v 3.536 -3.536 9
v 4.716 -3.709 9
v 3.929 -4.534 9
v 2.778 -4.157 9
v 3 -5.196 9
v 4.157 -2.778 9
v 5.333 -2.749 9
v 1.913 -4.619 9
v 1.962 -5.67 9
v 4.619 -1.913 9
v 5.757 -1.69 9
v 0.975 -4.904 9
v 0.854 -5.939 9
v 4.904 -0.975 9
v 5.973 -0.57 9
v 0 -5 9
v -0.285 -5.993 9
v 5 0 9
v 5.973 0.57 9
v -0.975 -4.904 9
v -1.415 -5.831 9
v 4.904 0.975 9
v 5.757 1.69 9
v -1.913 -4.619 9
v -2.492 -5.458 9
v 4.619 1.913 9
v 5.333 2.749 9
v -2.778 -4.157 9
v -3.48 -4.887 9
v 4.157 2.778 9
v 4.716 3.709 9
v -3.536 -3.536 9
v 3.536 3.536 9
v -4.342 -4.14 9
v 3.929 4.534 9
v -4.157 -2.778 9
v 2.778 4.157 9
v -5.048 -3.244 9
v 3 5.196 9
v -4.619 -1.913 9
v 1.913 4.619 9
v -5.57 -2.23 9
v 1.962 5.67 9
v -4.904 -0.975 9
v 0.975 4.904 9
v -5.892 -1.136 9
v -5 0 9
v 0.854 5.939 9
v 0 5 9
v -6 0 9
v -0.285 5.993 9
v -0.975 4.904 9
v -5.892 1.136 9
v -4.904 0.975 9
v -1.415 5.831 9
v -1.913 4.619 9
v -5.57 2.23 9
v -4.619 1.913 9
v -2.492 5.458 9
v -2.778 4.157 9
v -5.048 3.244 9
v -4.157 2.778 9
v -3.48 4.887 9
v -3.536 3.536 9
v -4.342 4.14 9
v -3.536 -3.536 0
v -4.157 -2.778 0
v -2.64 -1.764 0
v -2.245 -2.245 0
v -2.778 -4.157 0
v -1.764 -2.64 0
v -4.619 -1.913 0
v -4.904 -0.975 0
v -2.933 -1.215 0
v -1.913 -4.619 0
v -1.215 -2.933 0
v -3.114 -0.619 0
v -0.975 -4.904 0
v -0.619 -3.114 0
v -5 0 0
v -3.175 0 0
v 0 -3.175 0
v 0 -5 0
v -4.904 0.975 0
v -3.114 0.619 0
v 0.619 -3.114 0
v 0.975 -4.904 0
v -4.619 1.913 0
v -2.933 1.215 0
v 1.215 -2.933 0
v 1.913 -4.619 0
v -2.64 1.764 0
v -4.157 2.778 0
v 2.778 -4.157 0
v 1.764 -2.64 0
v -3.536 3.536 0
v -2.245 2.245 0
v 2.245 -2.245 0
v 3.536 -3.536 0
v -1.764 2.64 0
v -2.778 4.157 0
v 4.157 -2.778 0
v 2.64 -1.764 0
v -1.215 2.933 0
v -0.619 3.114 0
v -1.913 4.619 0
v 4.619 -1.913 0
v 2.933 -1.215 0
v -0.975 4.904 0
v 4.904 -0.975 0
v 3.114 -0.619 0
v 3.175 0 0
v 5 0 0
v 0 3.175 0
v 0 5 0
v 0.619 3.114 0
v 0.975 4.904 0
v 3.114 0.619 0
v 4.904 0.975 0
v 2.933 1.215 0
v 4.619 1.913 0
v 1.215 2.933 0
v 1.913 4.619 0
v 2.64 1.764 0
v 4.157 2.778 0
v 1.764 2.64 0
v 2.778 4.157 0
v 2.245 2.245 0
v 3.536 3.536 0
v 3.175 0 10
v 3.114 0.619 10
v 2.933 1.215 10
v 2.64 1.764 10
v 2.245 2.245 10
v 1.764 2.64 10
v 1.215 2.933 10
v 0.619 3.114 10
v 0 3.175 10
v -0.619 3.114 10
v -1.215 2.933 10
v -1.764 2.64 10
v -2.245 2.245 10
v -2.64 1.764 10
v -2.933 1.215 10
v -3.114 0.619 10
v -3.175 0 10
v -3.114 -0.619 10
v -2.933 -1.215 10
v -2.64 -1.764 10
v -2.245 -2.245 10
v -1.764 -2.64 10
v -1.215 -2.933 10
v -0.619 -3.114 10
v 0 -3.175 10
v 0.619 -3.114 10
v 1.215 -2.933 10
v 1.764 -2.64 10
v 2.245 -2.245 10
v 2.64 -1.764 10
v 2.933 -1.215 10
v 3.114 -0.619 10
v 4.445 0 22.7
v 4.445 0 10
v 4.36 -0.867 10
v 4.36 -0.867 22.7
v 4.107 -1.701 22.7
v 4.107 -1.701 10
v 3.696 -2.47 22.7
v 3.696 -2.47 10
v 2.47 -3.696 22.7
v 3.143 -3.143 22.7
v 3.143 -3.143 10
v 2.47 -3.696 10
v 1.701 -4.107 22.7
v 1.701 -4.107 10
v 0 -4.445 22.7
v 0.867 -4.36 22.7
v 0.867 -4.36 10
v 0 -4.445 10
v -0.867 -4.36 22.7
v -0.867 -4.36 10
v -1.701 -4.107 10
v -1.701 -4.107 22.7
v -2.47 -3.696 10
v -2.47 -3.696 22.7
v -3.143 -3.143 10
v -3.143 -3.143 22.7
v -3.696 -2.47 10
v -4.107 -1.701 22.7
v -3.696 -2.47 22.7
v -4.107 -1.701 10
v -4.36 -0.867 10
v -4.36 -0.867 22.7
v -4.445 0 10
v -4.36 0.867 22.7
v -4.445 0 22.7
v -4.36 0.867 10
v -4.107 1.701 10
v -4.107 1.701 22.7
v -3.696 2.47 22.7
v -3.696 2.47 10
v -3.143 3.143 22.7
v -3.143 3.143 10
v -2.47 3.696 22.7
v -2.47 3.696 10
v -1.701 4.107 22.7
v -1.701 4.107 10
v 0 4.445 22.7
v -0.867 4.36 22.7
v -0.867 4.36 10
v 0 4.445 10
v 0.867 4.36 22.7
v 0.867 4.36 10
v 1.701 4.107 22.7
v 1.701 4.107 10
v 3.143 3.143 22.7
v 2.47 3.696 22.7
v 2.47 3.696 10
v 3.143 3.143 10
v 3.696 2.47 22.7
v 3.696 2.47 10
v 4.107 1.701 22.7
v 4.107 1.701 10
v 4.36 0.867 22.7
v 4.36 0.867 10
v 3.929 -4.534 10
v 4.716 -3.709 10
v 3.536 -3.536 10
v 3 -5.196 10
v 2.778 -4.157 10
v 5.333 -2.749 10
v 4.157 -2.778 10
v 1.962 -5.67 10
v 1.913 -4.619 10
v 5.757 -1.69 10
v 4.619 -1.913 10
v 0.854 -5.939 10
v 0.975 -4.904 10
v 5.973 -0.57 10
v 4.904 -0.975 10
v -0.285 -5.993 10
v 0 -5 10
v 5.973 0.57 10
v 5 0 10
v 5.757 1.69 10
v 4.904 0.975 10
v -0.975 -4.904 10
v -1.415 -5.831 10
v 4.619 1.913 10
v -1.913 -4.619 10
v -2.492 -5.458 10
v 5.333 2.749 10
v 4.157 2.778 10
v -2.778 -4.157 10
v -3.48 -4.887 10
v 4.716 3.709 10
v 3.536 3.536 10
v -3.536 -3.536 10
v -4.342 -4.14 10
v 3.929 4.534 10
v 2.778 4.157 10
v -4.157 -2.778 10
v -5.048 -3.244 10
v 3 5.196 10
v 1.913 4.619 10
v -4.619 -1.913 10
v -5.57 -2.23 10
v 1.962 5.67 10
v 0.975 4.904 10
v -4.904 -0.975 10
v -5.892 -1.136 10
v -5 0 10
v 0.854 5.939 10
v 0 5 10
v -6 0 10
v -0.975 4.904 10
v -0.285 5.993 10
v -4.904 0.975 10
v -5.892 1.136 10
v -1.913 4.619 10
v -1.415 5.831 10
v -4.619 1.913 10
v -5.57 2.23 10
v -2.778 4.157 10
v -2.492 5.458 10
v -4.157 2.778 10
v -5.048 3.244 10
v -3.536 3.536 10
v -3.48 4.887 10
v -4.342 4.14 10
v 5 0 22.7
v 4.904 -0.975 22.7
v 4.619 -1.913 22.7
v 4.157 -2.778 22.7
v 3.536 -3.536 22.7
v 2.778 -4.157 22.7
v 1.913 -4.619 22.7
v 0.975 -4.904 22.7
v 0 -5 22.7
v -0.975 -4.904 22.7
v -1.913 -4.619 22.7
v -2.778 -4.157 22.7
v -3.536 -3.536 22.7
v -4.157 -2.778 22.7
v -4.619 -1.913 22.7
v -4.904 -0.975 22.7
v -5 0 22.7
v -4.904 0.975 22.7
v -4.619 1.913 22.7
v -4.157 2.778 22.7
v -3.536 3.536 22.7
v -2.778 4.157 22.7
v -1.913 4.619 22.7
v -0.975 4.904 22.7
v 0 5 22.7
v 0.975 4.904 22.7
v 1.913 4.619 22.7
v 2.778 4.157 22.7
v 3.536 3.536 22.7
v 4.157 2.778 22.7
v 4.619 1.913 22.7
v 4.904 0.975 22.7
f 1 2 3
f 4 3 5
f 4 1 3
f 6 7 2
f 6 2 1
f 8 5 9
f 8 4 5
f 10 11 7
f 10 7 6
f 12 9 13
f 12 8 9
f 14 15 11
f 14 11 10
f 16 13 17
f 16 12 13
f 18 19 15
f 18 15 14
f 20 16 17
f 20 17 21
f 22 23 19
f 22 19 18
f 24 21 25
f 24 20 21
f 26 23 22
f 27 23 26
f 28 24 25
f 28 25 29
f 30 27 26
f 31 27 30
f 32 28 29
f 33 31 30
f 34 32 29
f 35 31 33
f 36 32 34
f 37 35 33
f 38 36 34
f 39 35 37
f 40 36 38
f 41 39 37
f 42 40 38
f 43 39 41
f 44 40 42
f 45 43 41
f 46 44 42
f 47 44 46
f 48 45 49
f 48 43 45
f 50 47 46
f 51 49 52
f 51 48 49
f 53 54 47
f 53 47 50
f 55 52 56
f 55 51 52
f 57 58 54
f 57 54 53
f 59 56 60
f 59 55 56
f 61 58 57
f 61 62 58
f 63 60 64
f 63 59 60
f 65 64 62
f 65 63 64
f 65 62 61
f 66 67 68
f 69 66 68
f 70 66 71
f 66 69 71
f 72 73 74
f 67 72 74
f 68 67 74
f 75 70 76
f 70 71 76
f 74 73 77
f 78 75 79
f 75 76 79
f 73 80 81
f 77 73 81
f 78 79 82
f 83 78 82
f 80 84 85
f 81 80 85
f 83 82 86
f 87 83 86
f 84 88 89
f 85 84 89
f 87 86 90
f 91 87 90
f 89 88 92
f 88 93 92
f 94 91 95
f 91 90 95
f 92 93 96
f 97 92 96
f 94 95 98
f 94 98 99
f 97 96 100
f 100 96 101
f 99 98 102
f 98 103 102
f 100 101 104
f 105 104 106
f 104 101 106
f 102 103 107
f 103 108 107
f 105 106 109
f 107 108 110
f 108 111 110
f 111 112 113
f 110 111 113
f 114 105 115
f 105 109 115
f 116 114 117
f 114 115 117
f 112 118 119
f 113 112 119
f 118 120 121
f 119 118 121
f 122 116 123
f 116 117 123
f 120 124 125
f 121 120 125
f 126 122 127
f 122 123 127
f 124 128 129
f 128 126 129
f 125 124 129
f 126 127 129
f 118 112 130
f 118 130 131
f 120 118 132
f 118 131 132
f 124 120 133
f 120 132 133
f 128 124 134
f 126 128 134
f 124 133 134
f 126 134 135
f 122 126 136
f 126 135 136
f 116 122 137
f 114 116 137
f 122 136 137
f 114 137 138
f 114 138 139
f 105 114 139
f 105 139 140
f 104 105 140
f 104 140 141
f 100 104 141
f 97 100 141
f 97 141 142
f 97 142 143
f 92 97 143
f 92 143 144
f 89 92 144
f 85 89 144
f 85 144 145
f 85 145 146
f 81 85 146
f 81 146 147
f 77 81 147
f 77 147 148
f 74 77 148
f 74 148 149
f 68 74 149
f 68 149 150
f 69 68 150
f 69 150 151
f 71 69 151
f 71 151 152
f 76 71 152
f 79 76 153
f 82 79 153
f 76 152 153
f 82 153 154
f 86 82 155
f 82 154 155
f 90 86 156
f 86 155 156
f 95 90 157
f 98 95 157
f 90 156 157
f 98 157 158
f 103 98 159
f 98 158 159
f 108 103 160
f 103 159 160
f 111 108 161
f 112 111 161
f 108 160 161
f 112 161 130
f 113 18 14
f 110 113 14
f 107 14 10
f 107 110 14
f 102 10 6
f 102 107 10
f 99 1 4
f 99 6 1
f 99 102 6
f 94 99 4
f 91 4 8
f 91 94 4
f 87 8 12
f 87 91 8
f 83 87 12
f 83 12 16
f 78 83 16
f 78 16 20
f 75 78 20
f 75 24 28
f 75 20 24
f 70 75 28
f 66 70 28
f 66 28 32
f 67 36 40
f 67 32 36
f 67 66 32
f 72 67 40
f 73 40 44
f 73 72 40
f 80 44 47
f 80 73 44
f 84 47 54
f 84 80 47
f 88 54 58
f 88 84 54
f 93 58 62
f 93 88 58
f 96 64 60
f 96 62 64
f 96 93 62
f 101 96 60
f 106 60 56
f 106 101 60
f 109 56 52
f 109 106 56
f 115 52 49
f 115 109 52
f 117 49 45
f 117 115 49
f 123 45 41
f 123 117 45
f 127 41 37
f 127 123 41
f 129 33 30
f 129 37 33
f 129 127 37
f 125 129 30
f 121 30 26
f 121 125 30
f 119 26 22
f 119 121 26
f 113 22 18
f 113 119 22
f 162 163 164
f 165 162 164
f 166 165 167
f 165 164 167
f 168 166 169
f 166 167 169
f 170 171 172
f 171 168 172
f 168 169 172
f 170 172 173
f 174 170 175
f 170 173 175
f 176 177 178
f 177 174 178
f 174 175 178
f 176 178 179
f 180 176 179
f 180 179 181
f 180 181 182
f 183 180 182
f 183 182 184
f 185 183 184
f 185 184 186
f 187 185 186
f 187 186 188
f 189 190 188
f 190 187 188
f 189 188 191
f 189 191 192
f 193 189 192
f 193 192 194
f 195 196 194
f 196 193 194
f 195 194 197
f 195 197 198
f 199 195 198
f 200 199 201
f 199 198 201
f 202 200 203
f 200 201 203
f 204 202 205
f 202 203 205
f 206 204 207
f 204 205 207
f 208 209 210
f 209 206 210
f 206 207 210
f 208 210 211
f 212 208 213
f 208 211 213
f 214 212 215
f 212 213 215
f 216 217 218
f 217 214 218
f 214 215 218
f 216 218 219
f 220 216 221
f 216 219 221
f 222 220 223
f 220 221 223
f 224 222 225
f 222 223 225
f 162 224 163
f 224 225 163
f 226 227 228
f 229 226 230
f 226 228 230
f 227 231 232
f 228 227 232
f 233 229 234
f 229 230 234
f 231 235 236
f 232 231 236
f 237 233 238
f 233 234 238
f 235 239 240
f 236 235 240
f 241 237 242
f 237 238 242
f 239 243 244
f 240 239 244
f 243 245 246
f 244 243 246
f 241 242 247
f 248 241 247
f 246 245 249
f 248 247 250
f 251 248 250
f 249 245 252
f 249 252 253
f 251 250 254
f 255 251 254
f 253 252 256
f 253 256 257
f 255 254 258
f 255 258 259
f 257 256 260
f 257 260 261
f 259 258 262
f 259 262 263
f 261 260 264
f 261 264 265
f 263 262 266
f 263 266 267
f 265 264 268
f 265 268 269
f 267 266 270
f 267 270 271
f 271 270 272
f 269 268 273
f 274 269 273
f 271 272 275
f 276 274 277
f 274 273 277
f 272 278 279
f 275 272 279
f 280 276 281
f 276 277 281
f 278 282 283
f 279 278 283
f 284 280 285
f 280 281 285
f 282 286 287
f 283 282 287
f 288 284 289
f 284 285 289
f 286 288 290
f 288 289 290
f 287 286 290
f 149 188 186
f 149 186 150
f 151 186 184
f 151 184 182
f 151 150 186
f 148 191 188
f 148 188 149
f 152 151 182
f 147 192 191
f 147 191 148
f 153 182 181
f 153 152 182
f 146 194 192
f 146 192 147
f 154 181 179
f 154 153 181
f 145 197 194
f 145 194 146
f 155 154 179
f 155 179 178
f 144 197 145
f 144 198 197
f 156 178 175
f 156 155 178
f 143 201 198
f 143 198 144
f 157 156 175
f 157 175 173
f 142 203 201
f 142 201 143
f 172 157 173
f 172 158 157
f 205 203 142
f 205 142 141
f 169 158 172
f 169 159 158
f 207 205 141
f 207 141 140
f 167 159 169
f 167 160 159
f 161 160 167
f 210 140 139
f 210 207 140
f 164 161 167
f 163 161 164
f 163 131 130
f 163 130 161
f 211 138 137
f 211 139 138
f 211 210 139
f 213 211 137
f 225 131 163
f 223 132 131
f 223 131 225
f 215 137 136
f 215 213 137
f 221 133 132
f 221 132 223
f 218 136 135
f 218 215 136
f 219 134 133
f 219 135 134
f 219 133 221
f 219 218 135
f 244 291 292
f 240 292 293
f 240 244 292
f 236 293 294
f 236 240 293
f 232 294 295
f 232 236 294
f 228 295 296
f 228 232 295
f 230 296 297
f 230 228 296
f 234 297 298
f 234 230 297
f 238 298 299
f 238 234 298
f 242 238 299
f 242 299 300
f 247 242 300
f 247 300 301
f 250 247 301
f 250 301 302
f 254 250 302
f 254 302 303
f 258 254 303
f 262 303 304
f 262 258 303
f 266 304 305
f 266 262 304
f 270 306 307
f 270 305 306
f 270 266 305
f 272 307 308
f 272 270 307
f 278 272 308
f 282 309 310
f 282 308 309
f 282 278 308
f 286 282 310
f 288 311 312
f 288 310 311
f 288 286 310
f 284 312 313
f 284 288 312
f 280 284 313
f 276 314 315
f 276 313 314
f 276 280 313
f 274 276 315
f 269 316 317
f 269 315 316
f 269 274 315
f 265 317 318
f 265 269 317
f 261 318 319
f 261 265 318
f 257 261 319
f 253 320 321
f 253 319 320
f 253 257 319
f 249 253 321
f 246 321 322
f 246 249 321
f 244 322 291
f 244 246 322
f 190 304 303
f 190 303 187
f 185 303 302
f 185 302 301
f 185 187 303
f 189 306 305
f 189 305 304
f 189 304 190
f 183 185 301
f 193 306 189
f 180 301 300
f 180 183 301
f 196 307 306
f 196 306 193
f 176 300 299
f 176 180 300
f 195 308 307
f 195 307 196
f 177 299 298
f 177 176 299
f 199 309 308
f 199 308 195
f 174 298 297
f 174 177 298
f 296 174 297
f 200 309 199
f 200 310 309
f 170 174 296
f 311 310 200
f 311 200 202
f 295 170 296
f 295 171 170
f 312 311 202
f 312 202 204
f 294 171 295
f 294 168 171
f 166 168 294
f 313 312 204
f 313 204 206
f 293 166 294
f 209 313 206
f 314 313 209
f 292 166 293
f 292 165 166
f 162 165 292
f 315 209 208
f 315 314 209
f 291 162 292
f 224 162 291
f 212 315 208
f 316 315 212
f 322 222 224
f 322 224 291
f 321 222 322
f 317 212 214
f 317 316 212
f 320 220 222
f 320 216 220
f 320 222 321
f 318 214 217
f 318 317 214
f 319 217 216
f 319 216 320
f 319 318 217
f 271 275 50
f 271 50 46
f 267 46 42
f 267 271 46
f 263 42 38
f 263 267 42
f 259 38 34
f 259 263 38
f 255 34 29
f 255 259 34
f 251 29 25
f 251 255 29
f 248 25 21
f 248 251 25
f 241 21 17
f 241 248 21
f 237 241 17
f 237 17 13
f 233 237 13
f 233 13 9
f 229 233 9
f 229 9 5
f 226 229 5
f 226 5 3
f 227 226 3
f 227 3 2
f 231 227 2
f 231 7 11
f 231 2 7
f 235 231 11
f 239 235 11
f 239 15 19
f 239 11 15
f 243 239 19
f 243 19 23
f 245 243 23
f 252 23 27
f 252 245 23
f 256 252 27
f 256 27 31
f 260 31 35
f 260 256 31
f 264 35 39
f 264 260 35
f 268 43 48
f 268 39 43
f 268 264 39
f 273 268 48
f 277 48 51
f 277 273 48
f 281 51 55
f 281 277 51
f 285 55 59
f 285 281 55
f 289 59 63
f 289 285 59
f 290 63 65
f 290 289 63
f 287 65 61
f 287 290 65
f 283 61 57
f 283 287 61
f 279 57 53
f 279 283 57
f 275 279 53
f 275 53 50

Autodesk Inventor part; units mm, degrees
ref_plane "YZ Plane" through (0, 0, 0) normal (1, 0, 0) x (0, 1, 0)
ref_plane "XZ Plane" through (0, 0, 0) normal (0, 1, 0) x (-1, 0, 0)
sketch "Sketch1" plane through (0, 0, 0) normal (0, 0, 1) x (1, 0, 0)
  circle A0 centre (0, 0) radius 5
  dimension "d0" = 10
extrude "Extrusion1" add sketch "Sketch1" along normal blind 10
sketch "Sketch2" plane through (0, 0, 10) normal (0, 0, 1) x (1, 0, 0)
  circle A0 centre (0, 0) radius 5
  circle A1 centre (0, 0) radius 4.445
  dimension "d3" = 8.89
extrude "Extrusion2" add sketch "Sketch2" along normal blind 12.7
sketch "Sketch3" plane through (0, 0, 10) normal (0, 0, 1) x (1, 0, 0)
  circle A0 centre (0, 0) radius 3.175
  dimension "d8" = 6.35
extrude "Extrusion3" cut sketch "Sketch3" against normal blind 12.7
thread "Thread2" size "1/4-20 UNC" class "2B" standard "ANSI Unified Screw Threads" length 25.4
ref_plane "Work Plane1" through (0, 0, 10) normal (0, 0, -1) x (-1, 0, 0)
sketch "Sketch4" plane through (0, 0, 10) normal (0, 0, -1) x (-1, 0, 0)
  circle A0 centre (0, 0) radius 6
  circle A1 centre (0, 0) radius 5 projected
  dimension "d14" = 12
extrude "Extrusion4" add sketch "Sketch4" along normal blind 1
thread "Thread3" size "7/16-14 UNC" class "2A" standard "ANSI Unified Screw Threads" full length
properties part number "Pedal Connector Right"
